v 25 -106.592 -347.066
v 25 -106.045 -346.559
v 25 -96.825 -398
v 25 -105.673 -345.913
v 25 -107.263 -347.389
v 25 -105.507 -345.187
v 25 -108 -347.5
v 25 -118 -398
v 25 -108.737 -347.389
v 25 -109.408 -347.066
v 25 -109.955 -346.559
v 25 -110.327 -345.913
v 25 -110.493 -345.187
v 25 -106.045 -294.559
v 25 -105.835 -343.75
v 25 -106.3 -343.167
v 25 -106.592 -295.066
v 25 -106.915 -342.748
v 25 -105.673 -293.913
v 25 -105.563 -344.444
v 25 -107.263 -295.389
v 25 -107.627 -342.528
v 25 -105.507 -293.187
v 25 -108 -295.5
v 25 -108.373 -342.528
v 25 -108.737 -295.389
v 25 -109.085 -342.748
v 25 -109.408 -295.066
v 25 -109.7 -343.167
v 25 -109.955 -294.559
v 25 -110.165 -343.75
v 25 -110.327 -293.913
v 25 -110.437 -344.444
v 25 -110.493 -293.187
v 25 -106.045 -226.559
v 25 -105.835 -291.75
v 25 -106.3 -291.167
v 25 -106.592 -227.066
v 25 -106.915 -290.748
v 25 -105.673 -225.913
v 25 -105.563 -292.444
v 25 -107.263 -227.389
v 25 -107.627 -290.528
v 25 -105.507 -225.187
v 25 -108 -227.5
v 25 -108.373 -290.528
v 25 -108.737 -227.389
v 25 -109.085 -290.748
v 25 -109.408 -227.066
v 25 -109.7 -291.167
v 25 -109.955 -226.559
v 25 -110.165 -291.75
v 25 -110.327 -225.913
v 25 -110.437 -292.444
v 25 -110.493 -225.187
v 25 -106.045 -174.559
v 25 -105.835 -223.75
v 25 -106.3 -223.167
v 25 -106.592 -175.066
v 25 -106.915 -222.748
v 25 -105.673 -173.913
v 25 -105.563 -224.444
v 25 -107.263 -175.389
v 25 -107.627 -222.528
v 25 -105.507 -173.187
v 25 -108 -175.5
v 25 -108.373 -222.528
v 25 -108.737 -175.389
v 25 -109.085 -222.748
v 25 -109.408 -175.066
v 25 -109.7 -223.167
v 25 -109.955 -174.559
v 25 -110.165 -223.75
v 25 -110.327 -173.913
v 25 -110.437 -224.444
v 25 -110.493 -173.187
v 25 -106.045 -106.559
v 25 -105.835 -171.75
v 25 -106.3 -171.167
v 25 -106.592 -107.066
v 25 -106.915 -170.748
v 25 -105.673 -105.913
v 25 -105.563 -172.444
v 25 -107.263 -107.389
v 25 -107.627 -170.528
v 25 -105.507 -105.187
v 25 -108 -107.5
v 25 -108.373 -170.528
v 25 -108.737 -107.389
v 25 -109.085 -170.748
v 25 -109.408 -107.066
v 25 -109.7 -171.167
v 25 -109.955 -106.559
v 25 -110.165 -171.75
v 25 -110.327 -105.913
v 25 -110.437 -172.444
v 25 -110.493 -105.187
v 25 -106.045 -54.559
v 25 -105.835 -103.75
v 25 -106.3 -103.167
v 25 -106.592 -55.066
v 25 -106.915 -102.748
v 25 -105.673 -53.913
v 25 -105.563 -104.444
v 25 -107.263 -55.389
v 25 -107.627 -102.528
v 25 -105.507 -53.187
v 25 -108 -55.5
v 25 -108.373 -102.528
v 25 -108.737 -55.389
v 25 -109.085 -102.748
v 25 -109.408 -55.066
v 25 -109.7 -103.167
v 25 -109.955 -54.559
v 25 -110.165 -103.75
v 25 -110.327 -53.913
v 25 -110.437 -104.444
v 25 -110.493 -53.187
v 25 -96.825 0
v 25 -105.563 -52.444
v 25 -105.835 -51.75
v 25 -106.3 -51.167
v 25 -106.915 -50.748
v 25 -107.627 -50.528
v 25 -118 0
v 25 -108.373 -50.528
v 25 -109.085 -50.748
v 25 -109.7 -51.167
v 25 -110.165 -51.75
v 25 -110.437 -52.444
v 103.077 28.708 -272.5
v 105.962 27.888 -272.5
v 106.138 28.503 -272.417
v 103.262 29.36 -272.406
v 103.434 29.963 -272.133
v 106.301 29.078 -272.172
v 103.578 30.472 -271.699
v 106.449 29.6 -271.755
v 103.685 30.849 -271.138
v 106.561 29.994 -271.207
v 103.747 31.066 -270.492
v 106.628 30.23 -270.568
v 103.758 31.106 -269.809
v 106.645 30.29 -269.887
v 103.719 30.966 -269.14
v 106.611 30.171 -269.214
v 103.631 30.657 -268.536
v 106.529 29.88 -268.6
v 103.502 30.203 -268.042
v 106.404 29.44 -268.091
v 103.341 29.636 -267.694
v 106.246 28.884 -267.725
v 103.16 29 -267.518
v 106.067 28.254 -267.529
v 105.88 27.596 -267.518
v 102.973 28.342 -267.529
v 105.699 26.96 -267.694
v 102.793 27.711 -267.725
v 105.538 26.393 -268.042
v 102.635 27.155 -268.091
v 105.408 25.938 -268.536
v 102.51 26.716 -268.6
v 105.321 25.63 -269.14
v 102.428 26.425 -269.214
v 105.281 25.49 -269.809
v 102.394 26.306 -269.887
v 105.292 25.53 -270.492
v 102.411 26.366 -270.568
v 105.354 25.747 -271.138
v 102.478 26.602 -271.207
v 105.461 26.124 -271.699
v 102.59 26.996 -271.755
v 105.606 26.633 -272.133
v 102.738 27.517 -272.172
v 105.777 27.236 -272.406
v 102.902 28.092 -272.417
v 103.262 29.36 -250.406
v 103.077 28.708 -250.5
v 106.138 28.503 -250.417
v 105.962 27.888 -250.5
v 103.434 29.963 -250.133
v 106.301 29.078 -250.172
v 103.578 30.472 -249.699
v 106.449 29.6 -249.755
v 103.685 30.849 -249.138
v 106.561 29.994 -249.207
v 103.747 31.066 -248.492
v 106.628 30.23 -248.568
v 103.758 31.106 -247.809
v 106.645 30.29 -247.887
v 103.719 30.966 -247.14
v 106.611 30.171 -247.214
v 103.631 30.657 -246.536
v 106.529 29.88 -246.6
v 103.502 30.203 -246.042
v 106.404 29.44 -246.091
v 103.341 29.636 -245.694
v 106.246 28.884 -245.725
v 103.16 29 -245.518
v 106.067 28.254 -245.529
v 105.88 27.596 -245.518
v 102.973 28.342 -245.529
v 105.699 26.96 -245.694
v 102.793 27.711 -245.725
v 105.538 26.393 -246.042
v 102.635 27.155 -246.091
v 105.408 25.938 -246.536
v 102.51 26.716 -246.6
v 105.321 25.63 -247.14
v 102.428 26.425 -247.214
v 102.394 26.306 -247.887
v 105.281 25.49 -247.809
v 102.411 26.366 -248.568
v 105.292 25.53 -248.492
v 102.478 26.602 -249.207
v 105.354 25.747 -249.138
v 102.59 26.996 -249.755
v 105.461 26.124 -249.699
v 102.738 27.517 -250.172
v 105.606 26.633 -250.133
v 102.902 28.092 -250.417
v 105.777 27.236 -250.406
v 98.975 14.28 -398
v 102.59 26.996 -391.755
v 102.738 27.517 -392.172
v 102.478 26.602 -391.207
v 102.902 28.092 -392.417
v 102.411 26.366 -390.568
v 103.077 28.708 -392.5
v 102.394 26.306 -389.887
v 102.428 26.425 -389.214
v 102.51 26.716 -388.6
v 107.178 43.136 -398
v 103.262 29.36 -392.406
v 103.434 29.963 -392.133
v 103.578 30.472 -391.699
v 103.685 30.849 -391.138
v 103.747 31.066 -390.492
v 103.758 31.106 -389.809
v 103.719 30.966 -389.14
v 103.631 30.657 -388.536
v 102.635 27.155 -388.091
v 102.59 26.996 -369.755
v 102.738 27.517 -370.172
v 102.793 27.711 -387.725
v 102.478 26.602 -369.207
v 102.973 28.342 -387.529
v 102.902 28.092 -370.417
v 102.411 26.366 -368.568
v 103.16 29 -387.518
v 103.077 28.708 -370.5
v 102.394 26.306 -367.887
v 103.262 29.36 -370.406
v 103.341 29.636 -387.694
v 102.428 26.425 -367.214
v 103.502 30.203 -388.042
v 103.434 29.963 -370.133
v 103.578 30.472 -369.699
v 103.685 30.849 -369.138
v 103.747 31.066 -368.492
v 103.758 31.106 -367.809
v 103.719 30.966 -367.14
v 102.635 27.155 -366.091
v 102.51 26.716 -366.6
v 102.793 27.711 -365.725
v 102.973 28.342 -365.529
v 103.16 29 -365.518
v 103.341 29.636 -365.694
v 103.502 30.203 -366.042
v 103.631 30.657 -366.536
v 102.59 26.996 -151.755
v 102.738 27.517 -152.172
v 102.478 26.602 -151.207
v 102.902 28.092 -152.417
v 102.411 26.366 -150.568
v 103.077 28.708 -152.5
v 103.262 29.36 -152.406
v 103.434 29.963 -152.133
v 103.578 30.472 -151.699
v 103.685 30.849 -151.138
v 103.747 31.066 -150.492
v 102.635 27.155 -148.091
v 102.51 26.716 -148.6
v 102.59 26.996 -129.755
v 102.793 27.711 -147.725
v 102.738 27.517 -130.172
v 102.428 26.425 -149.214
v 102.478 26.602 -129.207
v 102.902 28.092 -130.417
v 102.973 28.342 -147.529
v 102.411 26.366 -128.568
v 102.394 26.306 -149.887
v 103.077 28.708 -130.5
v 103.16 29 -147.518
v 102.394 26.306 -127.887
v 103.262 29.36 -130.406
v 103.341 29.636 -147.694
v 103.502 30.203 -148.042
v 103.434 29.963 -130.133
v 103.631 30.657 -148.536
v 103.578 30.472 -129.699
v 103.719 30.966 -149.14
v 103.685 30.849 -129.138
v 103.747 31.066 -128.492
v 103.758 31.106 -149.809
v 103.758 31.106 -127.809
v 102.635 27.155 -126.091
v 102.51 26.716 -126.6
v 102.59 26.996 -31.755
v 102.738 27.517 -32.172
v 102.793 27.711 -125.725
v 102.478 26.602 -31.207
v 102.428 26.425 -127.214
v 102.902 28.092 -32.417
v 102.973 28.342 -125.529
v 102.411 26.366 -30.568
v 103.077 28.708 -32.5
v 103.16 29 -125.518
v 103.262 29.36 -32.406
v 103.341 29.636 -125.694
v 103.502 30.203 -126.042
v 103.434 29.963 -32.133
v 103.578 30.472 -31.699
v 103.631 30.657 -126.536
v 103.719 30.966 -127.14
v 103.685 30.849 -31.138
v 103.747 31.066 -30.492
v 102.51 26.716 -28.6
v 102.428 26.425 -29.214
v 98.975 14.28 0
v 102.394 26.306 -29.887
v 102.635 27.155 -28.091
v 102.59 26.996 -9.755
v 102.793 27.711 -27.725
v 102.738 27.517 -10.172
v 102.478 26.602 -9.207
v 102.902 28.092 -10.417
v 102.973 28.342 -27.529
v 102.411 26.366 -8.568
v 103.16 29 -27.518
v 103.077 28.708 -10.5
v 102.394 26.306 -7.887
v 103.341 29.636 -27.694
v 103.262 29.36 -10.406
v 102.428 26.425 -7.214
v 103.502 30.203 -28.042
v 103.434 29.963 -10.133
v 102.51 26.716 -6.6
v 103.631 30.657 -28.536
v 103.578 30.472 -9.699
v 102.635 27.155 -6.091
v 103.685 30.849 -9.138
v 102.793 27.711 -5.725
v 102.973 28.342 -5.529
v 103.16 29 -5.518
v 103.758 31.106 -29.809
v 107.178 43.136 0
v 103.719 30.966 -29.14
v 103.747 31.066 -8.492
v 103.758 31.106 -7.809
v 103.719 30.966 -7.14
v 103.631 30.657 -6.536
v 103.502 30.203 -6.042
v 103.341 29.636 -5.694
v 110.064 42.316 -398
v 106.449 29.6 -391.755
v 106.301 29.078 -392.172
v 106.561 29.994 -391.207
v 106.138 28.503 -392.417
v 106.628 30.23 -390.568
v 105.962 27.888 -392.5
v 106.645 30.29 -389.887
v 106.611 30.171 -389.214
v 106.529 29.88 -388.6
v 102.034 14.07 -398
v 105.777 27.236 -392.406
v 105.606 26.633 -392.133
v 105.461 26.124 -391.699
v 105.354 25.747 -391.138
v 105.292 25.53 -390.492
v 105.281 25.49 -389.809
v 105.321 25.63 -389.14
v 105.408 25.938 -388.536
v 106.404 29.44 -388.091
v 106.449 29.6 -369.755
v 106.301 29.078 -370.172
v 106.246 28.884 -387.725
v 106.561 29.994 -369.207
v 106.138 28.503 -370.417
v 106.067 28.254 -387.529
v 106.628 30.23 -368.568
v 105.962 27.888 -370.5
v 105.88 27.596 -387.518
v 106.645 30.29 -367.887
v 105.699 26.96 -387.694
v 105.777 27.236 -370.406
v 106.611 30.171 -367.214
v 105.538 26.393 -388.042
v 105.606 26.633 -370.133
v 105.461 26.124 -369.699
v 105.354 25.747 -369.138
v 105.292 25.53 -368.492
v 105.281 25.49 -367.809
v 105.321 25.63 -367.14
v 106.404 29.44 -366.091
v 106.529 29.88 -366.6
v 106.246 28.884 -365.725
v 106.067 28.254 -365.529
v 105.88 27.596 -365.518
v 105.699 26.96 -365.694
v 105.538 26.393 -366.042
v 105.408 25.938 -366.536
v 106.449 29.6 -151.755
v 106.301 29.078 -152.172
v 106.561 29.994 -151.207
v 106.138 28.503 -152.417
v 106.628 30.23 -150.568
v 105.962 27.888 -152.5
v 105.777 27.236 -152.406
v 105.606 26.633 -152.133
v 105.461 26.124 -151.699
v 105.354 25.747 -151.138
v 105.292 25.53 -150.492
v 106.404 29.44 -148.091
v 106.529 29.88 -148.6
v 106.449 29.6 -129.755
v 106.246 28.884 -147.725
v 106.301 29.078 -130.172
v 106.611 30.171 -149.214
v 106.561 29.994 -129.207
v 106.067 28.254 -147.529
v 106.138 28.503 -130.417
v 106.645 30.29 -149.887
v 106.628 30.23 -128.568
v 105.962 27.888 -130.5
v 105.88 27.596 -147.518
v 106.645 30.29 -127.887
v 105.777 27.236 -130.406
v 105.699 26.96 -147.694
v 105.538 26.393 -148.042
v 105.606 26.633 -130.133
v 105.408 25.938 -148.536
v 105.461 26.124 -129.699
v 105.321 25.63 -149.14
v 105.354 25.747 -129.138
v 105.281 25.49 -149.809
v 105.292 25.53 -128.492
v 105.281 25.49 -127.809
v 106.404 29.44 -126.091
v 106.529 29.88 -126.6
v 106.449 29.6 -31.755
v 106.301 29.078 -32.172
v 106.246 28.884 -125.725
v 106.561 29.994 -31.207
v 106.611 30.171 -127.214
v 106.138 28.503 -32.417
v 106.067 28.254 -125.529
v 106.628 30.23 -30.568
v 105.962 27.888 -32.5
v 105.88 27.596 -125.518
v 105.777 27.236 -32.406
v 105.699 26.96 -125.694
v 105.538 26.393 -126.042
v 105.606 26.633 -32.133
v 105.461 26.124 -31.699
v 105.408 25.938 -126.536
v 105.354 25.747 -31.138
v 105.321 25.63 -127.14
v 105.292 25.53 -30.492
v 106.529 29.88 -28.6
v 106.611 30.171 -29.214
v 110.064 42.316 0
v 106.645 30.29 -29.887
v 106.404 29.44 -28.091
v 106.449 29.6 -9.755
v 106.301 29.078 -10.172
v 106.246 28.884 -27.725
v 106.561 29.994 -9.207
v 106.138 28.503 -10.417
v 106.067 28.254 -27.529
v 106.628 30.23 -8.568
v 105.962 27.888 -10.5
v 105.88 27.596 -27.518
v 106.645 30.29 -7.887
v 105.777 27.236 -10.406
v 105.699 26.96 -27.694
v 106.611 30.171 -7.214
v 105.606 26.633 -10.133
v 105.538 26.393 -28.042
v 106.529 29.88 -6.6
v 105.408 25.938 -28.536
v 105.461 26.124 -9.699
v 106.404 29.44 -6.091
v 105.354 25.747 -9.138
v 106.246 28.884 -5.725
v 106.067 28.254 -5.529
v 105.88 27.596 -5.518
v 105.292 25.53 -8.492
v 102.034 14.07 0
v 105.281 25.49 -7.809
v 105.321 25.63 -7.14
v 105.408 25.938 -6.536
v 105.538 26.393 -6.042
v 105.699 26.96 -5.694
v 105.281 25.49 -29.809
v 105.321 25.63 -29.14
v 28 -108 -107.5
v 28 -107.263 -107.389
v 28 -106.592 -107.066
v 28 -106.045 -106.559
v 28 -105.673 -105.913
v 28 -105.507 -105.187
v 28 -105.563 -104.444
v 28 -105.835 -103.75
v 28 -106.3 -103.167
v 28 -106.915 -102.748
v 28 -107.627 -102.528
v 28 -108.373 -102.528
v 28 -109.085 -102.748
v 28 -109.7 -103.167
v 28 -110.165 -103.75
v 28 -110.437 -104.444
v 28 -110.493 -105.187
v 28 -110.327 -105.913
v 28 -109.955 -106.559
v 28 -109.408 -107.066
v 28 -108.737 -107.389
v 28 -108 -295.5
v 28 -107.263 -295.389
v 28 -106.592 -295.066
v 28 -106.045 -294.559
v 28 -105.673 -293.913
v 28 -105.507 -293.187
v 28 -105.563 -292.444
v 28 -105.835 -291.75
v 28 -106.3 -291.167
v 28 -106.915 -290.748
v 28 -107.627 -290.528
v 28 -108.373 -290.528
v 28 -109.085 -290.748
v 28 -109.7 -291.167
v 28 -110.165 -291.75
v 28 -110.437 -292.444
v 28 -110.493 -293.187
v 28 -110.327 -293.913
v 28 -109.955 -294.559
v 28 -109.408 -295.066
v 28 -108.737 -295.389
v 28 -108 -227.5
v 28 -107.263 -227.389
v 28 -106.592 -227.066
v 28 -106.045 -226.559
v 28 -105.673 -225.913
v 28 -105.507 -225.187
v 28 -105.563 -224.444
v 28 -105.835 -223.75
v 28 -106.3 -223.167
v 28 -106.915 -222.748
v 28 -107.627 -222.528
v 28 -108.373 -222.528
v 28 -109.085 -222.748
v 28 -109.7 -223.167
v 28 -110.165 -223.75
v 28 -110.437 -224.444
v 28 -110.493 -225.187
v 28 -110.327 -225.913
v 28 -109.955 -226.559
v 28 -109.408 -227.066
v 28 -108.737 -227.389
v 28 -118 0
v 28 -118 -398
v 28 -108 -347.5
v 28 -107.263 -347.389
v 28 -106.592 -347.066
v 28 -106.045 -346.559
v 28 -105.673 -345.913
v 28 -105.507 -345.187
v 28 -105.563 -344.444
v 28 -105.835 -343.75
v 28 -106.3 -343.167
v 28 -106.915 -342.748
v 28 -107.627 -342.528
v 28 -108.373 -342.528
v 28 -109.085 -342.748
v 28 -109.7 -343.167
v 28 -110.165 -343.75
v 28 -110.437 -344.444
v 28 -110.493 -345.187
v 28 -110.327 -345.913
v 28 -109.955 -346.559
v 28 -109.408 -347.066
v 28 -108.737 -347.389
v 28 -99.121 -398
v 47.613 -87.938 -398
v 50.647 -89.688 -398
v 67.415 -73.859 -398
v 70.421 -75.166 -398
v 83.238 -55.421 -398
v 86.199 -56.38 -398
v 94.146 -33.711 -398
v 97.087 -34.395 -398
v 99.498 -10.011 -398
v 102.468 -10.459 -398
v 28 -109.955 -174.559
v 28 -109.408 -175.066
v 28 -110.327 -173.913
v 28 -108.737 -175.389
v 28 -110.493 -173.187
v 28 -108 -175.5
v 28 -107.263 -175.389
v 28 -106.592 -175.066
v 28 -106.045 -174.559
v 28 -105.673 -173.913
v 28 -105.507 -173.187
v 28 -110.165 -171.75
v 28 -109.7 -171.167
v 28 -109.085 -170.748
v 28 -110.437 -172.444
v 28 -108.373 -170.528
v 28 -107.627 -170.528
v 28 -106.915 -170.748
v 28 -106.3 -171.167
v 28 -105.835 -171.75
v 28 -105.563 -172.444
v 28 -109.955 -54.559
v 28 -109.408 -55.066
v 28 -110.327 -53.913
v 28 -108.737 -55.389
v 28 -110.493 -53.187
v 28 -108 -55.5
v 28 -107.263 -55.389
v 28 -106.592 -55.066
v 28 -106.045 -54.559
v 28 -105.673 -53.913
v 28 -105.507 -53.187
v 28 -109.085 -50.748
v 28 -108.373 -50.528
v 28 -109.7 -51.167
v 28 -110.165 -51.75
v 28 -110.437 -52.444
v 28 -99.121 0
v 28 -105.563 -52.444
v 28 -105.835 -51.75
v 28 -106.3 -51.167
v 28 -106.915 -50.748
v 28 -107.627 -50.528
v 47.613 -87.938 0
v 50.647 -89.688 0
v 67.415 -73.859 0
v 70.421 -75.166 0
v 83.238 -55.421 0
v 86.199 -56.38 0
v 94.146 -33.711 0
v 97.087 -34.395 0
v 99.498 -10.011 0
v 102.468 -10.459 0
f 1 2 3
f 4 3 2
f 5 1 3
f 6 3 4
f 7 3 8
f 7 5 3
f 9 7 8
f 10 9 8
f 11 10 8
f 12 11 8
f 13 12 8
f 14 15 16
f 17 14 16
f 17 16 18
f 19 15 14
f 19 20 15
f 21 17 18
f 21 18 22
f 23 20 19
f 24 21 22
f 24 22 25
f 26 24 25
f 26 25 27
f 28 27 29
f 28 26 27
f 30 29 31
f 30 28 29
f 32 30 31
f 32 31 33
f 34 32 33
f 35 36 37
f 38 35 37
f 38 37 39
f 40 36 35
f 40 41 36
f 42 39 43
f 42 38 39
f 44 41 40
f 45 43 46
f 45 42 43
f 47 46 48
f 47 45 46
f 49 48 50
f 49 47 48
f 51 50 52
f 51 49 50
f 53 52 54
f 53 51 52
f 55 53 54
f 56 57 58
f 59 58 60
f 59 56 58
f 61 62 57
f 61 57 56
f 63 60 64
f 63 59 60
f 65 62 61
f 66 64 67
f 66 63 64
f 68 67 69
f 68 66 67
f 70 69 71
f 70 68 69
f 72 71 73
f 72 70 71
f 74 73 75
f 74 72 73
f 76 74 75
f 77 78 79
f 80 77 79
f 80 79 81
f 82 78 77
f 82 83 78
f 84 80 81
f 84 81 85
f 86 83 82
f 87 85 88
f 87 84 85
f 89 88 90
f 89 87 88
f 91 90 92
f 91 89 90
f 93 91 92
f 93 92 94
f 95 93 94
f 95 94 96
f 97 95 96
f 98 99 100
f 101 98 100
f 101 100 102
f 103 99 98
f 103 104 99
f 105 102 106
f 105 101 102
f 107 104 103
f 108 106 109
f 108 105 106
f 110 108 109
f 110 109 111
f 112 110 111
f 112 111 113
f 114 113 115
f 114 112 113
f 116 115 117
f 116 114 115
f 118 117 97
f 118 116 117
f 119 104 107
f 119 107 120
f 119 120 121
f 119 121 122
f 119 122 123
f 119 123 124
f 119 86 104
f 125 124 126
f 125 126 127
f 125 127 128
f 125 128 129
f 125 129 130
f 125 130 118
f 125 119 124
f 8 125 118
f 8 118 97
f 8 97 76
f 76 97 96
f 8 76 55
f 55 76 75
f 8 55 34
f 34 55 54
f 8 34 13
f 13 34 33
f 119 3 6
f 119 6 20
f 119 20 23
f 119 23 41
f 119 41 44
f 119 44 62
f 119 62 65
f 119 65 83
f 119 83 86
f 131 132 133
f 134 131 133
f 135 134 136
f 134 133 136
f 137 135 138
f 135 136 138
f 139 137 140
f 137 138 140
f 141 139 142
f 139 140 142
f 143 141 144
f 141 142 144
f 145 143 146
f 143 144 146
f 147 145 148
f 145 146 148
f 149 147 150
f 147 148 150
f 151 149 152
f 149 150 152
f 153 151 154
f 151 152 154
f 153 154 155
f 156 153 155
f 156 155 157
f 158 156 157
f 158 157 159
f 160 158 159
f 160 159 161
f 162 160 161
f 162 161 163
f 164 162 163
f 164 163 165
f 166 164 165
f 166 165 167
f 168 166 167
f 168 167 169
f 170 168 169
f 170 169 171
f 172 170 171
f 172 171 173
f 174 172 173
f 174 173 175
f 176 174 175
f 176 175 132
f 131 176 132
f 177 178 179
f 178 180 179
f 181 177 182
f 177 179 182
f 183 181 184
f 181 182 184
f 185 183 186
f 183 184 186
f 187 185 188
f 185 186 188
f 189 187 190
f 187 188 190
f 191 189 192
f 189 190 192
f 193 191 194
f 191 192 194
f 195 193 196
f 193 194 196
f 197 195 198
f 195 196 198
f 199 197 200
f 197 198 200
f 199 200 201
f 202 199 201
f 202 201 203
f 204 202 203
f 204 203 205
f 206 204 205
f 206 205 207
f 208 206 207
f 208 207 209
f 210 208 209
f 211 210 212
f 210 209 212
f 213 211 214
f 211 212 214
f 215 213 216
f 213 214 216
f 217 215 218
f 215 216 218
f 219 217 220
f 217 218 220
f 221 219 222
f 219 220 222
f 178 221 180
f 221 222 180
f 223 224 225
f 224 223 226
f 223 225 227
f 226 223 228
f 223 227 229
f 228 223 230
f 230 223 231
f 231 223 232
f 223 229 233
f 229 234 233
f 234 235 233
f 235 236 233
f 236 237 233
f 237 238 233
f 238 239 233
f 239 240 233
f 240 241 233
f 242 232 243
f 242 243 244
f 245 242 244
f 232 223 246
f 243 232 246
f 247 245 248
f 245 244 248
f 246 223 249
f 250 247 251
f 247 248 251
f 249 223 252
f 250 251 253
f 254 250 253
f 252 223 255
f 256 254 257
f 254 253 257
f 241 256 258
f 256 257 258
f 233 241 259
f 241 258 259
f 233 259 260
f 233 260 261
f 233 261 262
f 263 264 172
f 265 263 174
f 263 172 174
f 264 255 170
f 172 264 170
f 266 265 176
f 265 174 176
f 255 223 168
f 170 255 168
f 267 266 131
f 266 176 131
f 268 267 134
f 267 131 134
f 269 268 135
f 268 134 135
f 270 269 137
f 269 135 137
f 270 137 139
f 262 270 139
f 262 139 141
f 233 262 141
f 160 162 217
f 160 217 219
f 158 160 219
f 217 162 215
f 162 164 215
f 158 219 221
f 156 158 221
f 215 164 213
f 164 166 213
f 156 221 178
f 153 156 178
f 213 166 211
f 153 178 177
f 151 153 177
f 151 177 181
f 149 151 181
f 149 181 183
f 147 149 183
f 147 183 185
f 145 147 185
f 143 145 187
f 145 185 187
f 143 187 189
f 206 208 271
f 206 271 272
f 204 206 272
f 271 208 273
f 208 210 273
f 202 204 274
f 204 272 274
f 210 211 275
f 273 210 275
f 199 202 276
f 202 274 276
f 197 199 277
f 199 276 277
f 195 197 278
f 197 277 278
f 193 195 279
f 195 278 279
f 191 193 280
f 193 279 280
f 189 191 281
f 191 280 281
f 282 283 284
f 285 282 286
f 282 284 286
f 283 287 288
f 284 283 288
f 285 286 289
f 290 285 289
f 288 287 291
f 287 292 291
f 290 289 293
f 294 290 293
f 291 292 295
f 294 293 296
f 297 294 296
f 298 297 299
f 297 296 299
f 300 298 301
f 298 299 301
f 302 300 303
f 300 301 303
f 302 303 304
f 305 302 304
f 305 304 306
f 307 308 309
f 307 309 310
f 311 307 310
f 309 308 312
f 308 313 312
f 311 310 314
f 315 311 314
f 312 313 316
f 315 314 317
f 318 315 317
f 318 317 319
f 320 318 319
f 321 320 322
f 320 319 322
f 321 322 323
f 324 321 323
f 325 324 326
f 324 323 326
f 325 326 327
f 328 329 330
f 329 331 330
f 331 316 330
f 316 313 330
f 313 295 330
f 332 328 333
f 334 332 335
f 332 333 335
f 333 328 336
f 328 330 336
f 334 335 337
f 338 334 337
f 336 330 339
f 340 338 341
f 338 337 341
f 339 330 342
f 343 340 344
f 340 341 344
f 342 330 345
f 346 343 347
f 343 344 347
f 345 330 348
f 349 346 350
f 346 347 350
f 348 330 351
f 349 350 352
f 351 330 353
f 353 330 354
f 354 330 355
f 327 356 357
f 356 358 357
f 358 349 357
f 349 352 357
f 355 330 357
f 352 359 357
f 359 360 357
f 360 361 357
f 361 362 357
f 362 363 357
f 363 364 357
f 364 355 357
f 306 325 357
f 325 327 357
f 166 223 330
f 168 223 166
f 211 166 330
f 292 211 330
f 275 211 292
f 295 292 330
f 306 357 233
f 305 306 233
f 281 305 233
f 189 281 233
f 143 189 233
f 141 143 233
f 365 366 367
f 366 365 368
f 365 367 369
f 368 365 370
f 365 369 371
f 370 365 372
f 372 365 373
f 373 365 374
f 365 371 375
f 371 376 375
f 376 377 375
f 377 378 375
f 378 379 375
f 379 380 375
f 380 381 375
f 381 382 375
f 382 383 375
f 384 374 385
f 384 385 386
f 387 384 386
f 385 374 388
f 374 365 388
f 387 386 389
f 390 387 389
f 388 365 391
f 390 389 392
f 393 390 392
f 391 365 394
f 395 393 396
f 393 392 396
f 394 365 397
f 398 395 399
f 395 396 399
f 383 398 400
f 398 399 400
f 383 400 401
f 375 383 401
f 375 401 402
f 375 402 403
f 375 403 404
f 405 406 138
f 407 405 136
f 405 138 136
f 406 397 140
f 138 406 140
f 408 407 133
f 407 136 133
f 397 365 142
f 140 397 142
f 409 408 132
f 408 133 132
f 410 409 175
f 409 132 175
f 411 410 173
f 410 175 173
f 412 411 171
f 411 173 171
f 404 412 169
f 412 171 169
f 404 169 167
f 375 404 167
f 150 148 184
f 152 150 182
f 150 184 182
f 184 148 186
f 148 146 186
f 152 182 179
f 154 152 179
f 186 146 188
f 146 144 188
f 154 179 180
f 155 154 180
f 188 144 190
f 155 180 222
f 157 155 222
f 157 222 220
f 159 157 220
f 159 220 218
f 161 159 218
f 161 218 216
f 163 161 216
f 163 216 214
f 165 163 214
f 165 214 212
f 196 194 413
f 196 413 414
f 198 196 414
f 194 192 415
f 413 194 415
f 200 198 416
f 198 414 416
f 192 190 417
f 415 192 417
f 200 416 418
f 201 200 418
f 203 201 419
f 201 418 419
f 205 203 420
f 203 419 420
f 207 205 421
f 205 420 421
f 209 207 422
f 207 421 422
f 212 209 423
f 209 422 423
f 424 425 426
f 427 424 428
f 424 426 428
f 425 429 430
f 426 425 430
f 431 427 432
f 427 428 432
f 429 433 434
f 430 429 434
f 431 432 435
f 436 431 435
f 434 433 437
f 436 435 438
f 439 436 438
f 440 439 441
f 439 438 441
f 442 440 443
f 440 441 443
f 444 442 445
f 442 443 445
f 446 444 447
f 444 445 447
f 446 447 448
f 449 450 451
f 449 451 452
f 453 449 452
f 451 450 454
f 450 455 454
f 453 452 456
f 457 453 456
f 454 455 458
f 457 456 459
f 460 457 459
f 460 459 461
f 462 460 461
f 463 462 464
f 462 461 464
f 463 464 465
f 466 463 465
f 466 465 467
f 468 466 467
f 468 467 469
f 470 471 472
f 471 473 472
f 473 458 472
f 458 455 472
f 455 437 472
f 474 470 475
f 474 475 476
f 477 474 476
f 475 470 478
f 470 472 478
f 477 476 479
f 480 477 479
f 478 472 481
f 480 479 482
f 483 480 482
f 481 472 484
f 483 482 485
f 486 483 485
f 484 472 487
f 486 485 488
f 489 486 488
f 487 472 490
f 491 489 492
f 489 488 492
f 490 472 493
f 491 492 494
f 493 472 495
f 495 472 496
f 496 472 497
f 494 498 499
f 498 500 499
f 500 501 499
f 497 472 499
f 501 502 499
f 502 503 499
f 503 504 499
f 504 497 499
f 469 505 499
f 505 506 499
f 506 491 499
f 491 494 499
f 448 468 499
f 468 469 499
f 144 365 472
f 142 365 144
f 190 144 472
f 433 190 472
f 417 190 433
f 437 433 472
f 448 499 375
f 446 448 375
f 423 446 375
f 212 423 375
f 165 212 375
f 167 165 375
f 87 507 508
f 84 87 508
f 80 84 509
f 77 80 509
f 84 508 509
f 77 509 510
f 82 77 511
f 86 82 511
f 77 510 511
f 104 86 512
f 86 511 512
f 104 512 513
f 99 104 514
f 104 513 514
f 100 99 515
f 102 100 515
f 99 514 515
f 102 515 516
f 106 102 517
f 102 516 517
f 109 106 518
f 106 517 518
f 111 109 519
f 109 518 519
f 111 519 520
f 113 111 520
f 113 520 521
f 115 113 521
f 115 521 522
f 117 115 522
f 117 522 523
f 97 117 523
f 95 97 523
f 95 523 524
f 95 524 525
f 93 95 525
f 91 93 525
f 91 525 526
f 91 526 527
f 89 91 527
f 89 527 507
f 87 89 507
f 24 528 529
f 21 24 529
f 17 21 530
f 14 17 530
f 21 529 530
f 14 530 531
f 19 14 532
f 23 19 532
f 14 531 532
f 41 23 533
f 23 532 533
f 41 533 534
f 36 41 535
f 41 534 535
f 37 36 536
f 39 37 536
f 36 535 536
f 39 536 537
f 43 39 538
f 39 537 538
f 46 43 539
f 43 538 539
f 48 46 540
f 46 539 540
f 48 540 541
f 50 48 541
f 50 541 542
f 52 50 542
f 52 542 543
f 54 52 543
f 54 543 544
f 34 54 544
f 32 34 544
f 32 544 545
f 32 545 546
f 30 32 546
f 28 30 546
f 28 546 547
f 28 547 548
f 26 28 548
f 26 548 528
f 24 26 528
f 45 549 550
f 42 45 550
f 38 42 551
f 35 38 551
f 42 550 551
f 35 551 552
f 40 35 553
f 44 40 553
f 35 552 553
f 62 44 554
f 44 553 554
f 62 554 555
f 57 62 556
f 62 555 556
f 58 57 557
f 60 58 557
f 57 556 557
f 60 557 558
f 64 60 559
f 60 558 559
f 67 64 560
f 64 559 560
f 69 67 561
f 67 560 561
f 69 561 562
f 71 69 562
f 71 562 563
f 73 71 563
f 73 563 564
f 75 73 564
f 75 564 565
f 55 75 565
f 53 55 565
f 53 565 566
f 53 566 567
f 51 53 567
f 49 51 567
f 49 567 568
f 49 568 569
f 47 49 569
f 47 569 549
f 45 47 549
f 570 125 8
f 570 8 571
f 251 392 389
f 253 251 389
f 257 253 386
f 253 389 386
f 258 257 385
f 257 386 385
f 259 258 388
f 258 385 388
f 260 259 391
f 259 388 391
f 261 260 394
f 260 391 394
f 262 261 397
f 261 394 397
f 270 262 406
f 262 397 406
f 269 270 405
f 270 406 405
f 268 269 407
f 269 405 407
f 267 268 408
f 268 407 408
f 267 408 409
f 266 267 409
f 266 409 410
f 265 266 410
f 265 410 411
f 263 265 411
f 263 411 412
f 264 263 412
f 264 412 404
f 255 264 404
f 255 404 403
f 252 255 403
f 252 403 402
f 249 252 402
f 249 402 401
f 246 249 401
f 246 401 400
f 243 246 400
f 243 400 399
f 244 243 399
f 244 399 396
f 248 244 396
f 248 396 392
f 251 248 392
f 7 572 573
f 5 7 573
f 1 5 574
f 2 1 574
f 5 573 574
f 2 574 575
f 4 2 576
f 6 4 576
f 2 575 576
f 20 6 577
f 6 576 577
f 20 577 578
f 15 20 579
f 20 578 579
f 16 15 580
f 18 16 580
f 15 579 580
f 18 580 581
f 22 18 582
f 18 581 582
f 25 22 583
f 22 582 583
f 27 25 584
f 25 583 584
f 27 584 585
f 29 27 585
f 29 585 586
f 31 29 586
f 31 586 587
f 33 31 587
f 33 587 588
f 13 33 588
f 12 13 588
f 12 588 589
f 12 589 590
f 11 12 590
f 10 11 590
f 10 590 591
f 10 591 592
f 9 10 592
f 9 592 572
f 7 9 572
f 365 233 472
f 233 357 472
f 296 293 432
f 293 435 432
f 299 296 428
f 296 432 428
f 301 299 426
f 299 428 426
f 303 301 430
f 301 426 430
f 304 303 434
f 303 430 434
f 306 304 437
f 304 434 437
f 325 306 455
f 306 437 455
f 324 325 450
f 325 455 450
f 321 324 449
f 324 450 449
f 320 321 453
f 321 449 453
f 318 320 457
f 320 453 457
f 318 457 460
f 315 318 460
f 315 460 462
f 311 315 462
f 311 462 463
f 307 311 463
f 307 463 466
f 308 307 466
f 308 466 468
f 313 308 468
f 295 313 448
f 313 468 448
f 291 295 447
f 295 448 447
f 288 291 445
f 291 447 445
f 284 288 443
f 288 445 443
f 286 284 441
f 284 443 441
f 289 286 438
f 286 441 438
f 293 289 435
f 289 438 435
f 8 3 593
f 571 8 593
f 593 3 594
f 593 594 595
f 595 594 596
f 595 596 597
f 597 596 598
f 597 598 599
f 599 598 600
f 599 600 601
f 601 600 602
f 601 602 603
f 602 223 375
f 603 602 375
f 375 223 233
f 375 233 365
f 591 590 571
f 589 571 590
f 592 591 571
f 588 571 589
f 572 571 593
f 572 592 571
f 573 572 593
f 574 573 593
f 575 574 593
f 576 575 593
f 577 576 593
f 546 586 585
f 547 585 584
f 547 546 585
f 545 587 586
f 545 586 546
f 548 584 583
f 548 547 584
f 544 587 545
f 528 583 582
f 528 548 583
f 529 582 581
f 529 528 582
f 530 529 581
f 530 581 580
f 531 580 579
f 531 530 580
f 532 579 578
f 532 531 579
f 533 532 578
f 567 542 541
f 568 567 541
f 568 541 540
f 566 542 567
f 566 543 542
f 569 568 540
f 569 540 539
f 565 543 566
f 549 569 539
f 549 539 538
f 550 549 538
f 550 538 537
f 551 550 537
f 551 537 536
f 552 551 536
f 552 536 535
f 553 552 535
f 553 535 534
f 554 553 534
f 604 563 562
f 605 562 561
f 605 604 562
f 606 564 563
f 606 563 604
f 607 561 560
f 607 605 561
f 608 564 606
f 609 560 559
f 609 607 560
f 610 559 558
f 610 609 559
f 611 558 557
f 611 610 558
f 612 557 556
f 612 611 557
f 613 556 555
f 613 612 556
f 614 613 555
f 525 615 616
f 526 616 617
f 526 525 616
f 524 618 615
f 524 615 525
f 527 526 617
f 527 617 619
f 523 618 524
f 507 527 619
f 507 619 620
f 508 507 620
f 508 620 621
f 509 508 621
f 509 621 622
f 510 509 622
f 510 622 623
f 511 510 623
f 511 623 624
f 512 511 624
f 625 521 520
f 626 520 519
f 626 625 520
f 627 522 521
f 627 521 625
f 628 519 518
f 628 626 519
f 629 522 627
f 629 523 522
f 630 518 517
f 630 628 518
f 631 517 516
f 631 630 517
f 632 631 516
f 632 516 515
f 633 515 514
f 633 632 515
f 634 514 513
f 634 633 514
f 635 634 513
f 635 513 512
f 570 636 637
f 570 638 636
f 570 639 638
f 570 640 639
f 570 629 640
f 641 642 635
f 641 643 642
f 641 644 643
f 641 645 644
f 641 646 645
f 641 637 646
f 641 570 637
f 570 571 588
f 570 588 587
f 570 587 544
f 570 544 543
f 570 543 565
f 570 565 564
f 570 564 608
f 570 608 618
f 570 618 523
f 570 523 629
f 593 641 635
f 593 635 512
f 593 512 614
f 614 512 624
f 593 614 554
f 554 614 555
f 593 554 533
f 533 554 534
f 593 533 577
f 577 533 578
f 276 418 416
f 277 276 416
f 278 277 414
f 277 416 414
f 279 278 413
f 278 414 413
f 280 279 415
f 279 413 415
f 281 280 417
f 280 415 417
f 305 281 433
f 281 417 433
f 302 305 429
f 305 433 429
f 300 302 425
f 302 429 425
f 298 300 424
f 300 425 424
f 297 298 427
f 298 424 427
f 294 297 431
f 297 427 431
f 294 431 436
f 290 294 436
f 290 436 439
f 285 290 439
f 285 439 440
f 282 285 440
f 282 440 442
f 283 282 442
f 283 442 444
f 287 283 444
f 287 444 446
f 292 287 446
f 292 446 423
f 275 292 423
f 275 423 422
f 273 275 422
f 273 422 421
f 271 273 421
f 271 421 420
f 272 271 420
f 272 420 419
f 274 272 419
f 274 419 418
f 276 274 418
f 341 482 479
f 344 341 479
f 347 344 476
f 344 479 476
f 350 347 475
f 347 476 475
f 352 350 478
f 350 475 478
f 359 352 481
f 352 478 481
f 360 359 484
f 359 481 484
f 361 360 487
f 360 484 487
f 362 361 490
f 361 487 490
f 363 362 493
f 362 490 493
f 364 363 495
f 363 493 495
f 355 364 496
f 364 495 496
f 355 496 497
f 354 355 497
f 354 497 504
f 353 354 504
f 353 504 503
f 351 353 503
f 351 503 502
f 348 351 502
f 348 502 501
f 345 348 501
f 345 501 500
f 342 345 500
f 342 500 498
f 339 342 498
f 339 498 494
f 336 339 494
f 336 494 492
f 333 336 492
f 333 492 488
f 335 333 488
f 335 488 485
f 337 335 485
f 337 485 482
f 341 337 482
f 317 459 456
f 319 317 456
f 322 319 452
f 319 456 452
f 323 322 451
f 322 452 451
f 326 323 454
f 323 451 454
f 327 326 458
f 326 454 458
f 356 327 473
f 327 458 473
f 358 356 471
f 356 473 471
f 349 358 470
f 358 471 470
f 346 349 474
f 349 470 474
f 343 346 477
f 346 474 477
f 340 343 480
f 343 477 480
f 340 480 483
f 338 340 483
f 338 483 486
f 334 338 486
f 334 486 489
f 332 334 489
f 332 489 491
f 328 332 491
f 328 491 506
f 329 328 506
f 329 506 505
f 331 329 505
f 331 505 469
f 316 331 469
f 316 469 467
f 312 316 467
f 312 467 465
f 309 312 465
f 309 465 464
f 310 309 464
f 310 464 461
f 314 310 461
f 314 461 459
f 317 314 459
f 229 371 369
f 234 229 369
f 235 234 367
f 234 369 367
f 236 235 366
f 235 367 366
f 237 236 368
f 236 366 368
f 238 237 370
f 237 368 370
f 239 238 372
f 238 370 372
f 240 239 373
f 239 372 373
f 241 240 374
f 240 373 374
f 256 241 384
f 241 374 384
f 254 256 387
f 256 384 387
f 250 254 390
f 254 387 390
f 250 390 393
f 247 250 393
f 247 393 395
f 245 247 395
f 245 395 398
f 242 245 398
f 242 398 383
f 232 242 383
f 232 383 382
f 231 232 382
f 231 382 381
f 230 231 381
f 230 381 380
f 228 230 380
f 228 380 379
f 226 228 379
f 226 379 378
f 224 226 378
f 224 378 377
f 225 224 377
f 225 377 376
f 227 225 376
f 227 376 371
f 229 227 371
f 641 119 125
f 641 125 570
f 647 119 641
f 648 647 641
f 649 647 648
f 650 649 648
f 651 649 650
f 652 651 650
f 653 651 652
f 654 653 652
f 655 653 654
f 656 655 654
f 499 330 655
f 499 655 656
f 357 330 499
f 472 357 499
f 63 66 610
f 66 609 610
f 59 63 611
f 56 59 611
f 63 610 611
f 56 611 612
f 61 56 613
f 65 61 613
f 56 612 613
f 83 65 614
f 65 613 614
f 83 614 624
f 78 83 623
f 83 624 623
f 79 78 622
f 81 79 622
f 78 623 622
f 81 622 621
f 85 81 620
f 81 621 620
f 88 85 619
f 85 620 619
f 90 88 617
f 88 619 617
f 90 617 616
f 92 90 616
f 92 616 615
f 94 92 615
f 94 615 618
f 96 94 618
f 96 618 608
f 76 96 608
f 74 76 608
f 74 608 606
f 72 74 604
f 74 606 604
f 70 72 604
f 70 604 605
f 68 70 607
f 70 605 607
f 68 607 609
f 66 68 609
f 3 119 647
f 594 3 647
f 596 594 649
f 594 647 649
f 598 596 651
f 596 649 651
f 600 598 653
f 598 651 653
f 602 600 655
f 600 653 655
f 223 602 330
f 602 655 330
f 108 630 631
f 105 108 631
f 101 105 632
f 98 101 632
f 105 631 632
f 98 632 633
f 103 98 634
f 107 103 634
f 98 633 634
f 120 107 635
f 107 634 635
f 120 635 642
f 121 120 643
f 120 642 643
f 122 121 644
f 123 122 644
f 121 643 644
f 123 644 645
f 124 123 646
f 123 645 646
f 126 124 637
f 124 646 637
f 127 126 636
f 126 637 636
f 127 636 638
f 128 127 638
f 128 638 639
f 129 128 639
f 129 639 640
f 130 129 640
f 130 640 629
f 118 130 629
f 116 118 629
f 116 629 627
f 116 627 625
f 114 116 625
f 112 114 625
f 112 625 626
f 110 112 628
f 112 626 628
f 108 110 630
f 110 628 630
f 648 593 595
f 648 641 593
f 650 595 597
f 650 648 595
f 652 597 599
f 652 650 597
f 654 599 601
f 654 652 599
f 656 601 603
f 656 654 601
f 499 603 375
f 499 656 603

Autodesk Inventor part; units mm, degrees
ref_plane "YZ Plane" through (0, 0, 0) normal (1, 0, 0) x (0, 1, 0)
ref_plane "XZ Plane" through (0, 0, 0) normal (0, 1, 0) x (-1, 0, 0)
ref_plane "XY Plane" through (0, 0, 0) normal (0, 0, 1) x (1, 0, 0)
sketch "草图1" plane through (0, 0, 0) normal (0, 0, 1) x (1, 0, 0)
  circle A0 centre (0, 0) radius 100
  line L0 (-25, -96.8246) -> (25, -96.8246)
  line L1 (25, -96.8246) -> (25, -118)
  line L2 (25, -118) -> (-25, -118)
  line L3 (-25, -118) -> (-25, -96.8246)
  line L4 (0, -100) -> (-25, -100)
  arc A1 (28, -99.1211) -> (102.0345, 14.0701) centre (0, 0) ccw
  line L5 (25, -118) -> (28, -118)
  line L6 (28, -118) -> (28, -99.1211)
  line L7 (98.9752, 14.2797) -> (107.1784, 43.1364)
  line L8 (107.1784, 43.1364) -> (110.0641, 42.3161)
  line L9 (110.0641, 42.3161) -> (102.0345, 14.0701)
  line L10 (-25, 96.8246) -> (-25, 300)
  line L11 (-25, 300) -> (175, 300)
  line L12 (175, 300) -> (96.8246, 25)
  dimension "d0" = 200
  dimension "d1" = 50
  dimension "d2" = 18
  dimension "d3" = 3
  dimension "d4" = 3
  dimension "d5" = 3
  dimension "d6" = 200
  dimension "d7" = 25
  dimension "d8" = 25
  dimension "d9" = 5
  dimension "d10" = 300
  dimension "d11" = 30
extrude "拉伸1" add sketch "草图1" against normal blind 398 contours A0 L7 L8 L9 A1 L6 L5 L1
sketch "草图2" plane through (28, -118, 0) normal (1, 0, 0) x (0, 0, -1)
  circle A0 centre (293, 10) radius 2.5
  circle A1 centre (345, 10) radius 2.5
  line L0 (0, 0) -> (398, 0) projected
  line L1 (398, 18.8789) -> (398, 0) projected
  point P0 (0, 118)
  dimension "d14" = 5
  dimension "d15" = 5
  dimension "d16" = 10
  dimension "d17" = 10
  dimension "d18" = 53
  dimension "d19" = 105
extrude "拉伸2" cut sketch "草图2" against normal blind 3
pattern_linear "矩形阵列1" count 3 spacing 120 along (0, 0, 1) of "拉伸2"
sketch "草图3" plane through (102.0345, 14.0701, 0) normal (0.9619, -0.2734, 0) x (0, 0, -1)
  circle A0 centre (390, 14.3651) radius 2.5
  circle A1 centre (368, 14.3651) radius 2.5
  line L0 (0, 29.3651) -> (398, 29.3651) projected
  line L1 (398, 29.3651) -> (398, 0) projected
  point P0 (0, -41.4342)
  dimension "d25" = 5
  dimension "d26" = 5
  dimension "d27" = 15
  dimension "d28" = 15
  dimension "d29" = 8
  dimension "d30" = 30
extrude "拉伸3" cut sketch "草图3" against normal blind 3
pattern_linear "矩形阵列2" count 4 spacing 120 along (0, 0, 1) of "拉伸3"
properties part number "装填斗后罩"
